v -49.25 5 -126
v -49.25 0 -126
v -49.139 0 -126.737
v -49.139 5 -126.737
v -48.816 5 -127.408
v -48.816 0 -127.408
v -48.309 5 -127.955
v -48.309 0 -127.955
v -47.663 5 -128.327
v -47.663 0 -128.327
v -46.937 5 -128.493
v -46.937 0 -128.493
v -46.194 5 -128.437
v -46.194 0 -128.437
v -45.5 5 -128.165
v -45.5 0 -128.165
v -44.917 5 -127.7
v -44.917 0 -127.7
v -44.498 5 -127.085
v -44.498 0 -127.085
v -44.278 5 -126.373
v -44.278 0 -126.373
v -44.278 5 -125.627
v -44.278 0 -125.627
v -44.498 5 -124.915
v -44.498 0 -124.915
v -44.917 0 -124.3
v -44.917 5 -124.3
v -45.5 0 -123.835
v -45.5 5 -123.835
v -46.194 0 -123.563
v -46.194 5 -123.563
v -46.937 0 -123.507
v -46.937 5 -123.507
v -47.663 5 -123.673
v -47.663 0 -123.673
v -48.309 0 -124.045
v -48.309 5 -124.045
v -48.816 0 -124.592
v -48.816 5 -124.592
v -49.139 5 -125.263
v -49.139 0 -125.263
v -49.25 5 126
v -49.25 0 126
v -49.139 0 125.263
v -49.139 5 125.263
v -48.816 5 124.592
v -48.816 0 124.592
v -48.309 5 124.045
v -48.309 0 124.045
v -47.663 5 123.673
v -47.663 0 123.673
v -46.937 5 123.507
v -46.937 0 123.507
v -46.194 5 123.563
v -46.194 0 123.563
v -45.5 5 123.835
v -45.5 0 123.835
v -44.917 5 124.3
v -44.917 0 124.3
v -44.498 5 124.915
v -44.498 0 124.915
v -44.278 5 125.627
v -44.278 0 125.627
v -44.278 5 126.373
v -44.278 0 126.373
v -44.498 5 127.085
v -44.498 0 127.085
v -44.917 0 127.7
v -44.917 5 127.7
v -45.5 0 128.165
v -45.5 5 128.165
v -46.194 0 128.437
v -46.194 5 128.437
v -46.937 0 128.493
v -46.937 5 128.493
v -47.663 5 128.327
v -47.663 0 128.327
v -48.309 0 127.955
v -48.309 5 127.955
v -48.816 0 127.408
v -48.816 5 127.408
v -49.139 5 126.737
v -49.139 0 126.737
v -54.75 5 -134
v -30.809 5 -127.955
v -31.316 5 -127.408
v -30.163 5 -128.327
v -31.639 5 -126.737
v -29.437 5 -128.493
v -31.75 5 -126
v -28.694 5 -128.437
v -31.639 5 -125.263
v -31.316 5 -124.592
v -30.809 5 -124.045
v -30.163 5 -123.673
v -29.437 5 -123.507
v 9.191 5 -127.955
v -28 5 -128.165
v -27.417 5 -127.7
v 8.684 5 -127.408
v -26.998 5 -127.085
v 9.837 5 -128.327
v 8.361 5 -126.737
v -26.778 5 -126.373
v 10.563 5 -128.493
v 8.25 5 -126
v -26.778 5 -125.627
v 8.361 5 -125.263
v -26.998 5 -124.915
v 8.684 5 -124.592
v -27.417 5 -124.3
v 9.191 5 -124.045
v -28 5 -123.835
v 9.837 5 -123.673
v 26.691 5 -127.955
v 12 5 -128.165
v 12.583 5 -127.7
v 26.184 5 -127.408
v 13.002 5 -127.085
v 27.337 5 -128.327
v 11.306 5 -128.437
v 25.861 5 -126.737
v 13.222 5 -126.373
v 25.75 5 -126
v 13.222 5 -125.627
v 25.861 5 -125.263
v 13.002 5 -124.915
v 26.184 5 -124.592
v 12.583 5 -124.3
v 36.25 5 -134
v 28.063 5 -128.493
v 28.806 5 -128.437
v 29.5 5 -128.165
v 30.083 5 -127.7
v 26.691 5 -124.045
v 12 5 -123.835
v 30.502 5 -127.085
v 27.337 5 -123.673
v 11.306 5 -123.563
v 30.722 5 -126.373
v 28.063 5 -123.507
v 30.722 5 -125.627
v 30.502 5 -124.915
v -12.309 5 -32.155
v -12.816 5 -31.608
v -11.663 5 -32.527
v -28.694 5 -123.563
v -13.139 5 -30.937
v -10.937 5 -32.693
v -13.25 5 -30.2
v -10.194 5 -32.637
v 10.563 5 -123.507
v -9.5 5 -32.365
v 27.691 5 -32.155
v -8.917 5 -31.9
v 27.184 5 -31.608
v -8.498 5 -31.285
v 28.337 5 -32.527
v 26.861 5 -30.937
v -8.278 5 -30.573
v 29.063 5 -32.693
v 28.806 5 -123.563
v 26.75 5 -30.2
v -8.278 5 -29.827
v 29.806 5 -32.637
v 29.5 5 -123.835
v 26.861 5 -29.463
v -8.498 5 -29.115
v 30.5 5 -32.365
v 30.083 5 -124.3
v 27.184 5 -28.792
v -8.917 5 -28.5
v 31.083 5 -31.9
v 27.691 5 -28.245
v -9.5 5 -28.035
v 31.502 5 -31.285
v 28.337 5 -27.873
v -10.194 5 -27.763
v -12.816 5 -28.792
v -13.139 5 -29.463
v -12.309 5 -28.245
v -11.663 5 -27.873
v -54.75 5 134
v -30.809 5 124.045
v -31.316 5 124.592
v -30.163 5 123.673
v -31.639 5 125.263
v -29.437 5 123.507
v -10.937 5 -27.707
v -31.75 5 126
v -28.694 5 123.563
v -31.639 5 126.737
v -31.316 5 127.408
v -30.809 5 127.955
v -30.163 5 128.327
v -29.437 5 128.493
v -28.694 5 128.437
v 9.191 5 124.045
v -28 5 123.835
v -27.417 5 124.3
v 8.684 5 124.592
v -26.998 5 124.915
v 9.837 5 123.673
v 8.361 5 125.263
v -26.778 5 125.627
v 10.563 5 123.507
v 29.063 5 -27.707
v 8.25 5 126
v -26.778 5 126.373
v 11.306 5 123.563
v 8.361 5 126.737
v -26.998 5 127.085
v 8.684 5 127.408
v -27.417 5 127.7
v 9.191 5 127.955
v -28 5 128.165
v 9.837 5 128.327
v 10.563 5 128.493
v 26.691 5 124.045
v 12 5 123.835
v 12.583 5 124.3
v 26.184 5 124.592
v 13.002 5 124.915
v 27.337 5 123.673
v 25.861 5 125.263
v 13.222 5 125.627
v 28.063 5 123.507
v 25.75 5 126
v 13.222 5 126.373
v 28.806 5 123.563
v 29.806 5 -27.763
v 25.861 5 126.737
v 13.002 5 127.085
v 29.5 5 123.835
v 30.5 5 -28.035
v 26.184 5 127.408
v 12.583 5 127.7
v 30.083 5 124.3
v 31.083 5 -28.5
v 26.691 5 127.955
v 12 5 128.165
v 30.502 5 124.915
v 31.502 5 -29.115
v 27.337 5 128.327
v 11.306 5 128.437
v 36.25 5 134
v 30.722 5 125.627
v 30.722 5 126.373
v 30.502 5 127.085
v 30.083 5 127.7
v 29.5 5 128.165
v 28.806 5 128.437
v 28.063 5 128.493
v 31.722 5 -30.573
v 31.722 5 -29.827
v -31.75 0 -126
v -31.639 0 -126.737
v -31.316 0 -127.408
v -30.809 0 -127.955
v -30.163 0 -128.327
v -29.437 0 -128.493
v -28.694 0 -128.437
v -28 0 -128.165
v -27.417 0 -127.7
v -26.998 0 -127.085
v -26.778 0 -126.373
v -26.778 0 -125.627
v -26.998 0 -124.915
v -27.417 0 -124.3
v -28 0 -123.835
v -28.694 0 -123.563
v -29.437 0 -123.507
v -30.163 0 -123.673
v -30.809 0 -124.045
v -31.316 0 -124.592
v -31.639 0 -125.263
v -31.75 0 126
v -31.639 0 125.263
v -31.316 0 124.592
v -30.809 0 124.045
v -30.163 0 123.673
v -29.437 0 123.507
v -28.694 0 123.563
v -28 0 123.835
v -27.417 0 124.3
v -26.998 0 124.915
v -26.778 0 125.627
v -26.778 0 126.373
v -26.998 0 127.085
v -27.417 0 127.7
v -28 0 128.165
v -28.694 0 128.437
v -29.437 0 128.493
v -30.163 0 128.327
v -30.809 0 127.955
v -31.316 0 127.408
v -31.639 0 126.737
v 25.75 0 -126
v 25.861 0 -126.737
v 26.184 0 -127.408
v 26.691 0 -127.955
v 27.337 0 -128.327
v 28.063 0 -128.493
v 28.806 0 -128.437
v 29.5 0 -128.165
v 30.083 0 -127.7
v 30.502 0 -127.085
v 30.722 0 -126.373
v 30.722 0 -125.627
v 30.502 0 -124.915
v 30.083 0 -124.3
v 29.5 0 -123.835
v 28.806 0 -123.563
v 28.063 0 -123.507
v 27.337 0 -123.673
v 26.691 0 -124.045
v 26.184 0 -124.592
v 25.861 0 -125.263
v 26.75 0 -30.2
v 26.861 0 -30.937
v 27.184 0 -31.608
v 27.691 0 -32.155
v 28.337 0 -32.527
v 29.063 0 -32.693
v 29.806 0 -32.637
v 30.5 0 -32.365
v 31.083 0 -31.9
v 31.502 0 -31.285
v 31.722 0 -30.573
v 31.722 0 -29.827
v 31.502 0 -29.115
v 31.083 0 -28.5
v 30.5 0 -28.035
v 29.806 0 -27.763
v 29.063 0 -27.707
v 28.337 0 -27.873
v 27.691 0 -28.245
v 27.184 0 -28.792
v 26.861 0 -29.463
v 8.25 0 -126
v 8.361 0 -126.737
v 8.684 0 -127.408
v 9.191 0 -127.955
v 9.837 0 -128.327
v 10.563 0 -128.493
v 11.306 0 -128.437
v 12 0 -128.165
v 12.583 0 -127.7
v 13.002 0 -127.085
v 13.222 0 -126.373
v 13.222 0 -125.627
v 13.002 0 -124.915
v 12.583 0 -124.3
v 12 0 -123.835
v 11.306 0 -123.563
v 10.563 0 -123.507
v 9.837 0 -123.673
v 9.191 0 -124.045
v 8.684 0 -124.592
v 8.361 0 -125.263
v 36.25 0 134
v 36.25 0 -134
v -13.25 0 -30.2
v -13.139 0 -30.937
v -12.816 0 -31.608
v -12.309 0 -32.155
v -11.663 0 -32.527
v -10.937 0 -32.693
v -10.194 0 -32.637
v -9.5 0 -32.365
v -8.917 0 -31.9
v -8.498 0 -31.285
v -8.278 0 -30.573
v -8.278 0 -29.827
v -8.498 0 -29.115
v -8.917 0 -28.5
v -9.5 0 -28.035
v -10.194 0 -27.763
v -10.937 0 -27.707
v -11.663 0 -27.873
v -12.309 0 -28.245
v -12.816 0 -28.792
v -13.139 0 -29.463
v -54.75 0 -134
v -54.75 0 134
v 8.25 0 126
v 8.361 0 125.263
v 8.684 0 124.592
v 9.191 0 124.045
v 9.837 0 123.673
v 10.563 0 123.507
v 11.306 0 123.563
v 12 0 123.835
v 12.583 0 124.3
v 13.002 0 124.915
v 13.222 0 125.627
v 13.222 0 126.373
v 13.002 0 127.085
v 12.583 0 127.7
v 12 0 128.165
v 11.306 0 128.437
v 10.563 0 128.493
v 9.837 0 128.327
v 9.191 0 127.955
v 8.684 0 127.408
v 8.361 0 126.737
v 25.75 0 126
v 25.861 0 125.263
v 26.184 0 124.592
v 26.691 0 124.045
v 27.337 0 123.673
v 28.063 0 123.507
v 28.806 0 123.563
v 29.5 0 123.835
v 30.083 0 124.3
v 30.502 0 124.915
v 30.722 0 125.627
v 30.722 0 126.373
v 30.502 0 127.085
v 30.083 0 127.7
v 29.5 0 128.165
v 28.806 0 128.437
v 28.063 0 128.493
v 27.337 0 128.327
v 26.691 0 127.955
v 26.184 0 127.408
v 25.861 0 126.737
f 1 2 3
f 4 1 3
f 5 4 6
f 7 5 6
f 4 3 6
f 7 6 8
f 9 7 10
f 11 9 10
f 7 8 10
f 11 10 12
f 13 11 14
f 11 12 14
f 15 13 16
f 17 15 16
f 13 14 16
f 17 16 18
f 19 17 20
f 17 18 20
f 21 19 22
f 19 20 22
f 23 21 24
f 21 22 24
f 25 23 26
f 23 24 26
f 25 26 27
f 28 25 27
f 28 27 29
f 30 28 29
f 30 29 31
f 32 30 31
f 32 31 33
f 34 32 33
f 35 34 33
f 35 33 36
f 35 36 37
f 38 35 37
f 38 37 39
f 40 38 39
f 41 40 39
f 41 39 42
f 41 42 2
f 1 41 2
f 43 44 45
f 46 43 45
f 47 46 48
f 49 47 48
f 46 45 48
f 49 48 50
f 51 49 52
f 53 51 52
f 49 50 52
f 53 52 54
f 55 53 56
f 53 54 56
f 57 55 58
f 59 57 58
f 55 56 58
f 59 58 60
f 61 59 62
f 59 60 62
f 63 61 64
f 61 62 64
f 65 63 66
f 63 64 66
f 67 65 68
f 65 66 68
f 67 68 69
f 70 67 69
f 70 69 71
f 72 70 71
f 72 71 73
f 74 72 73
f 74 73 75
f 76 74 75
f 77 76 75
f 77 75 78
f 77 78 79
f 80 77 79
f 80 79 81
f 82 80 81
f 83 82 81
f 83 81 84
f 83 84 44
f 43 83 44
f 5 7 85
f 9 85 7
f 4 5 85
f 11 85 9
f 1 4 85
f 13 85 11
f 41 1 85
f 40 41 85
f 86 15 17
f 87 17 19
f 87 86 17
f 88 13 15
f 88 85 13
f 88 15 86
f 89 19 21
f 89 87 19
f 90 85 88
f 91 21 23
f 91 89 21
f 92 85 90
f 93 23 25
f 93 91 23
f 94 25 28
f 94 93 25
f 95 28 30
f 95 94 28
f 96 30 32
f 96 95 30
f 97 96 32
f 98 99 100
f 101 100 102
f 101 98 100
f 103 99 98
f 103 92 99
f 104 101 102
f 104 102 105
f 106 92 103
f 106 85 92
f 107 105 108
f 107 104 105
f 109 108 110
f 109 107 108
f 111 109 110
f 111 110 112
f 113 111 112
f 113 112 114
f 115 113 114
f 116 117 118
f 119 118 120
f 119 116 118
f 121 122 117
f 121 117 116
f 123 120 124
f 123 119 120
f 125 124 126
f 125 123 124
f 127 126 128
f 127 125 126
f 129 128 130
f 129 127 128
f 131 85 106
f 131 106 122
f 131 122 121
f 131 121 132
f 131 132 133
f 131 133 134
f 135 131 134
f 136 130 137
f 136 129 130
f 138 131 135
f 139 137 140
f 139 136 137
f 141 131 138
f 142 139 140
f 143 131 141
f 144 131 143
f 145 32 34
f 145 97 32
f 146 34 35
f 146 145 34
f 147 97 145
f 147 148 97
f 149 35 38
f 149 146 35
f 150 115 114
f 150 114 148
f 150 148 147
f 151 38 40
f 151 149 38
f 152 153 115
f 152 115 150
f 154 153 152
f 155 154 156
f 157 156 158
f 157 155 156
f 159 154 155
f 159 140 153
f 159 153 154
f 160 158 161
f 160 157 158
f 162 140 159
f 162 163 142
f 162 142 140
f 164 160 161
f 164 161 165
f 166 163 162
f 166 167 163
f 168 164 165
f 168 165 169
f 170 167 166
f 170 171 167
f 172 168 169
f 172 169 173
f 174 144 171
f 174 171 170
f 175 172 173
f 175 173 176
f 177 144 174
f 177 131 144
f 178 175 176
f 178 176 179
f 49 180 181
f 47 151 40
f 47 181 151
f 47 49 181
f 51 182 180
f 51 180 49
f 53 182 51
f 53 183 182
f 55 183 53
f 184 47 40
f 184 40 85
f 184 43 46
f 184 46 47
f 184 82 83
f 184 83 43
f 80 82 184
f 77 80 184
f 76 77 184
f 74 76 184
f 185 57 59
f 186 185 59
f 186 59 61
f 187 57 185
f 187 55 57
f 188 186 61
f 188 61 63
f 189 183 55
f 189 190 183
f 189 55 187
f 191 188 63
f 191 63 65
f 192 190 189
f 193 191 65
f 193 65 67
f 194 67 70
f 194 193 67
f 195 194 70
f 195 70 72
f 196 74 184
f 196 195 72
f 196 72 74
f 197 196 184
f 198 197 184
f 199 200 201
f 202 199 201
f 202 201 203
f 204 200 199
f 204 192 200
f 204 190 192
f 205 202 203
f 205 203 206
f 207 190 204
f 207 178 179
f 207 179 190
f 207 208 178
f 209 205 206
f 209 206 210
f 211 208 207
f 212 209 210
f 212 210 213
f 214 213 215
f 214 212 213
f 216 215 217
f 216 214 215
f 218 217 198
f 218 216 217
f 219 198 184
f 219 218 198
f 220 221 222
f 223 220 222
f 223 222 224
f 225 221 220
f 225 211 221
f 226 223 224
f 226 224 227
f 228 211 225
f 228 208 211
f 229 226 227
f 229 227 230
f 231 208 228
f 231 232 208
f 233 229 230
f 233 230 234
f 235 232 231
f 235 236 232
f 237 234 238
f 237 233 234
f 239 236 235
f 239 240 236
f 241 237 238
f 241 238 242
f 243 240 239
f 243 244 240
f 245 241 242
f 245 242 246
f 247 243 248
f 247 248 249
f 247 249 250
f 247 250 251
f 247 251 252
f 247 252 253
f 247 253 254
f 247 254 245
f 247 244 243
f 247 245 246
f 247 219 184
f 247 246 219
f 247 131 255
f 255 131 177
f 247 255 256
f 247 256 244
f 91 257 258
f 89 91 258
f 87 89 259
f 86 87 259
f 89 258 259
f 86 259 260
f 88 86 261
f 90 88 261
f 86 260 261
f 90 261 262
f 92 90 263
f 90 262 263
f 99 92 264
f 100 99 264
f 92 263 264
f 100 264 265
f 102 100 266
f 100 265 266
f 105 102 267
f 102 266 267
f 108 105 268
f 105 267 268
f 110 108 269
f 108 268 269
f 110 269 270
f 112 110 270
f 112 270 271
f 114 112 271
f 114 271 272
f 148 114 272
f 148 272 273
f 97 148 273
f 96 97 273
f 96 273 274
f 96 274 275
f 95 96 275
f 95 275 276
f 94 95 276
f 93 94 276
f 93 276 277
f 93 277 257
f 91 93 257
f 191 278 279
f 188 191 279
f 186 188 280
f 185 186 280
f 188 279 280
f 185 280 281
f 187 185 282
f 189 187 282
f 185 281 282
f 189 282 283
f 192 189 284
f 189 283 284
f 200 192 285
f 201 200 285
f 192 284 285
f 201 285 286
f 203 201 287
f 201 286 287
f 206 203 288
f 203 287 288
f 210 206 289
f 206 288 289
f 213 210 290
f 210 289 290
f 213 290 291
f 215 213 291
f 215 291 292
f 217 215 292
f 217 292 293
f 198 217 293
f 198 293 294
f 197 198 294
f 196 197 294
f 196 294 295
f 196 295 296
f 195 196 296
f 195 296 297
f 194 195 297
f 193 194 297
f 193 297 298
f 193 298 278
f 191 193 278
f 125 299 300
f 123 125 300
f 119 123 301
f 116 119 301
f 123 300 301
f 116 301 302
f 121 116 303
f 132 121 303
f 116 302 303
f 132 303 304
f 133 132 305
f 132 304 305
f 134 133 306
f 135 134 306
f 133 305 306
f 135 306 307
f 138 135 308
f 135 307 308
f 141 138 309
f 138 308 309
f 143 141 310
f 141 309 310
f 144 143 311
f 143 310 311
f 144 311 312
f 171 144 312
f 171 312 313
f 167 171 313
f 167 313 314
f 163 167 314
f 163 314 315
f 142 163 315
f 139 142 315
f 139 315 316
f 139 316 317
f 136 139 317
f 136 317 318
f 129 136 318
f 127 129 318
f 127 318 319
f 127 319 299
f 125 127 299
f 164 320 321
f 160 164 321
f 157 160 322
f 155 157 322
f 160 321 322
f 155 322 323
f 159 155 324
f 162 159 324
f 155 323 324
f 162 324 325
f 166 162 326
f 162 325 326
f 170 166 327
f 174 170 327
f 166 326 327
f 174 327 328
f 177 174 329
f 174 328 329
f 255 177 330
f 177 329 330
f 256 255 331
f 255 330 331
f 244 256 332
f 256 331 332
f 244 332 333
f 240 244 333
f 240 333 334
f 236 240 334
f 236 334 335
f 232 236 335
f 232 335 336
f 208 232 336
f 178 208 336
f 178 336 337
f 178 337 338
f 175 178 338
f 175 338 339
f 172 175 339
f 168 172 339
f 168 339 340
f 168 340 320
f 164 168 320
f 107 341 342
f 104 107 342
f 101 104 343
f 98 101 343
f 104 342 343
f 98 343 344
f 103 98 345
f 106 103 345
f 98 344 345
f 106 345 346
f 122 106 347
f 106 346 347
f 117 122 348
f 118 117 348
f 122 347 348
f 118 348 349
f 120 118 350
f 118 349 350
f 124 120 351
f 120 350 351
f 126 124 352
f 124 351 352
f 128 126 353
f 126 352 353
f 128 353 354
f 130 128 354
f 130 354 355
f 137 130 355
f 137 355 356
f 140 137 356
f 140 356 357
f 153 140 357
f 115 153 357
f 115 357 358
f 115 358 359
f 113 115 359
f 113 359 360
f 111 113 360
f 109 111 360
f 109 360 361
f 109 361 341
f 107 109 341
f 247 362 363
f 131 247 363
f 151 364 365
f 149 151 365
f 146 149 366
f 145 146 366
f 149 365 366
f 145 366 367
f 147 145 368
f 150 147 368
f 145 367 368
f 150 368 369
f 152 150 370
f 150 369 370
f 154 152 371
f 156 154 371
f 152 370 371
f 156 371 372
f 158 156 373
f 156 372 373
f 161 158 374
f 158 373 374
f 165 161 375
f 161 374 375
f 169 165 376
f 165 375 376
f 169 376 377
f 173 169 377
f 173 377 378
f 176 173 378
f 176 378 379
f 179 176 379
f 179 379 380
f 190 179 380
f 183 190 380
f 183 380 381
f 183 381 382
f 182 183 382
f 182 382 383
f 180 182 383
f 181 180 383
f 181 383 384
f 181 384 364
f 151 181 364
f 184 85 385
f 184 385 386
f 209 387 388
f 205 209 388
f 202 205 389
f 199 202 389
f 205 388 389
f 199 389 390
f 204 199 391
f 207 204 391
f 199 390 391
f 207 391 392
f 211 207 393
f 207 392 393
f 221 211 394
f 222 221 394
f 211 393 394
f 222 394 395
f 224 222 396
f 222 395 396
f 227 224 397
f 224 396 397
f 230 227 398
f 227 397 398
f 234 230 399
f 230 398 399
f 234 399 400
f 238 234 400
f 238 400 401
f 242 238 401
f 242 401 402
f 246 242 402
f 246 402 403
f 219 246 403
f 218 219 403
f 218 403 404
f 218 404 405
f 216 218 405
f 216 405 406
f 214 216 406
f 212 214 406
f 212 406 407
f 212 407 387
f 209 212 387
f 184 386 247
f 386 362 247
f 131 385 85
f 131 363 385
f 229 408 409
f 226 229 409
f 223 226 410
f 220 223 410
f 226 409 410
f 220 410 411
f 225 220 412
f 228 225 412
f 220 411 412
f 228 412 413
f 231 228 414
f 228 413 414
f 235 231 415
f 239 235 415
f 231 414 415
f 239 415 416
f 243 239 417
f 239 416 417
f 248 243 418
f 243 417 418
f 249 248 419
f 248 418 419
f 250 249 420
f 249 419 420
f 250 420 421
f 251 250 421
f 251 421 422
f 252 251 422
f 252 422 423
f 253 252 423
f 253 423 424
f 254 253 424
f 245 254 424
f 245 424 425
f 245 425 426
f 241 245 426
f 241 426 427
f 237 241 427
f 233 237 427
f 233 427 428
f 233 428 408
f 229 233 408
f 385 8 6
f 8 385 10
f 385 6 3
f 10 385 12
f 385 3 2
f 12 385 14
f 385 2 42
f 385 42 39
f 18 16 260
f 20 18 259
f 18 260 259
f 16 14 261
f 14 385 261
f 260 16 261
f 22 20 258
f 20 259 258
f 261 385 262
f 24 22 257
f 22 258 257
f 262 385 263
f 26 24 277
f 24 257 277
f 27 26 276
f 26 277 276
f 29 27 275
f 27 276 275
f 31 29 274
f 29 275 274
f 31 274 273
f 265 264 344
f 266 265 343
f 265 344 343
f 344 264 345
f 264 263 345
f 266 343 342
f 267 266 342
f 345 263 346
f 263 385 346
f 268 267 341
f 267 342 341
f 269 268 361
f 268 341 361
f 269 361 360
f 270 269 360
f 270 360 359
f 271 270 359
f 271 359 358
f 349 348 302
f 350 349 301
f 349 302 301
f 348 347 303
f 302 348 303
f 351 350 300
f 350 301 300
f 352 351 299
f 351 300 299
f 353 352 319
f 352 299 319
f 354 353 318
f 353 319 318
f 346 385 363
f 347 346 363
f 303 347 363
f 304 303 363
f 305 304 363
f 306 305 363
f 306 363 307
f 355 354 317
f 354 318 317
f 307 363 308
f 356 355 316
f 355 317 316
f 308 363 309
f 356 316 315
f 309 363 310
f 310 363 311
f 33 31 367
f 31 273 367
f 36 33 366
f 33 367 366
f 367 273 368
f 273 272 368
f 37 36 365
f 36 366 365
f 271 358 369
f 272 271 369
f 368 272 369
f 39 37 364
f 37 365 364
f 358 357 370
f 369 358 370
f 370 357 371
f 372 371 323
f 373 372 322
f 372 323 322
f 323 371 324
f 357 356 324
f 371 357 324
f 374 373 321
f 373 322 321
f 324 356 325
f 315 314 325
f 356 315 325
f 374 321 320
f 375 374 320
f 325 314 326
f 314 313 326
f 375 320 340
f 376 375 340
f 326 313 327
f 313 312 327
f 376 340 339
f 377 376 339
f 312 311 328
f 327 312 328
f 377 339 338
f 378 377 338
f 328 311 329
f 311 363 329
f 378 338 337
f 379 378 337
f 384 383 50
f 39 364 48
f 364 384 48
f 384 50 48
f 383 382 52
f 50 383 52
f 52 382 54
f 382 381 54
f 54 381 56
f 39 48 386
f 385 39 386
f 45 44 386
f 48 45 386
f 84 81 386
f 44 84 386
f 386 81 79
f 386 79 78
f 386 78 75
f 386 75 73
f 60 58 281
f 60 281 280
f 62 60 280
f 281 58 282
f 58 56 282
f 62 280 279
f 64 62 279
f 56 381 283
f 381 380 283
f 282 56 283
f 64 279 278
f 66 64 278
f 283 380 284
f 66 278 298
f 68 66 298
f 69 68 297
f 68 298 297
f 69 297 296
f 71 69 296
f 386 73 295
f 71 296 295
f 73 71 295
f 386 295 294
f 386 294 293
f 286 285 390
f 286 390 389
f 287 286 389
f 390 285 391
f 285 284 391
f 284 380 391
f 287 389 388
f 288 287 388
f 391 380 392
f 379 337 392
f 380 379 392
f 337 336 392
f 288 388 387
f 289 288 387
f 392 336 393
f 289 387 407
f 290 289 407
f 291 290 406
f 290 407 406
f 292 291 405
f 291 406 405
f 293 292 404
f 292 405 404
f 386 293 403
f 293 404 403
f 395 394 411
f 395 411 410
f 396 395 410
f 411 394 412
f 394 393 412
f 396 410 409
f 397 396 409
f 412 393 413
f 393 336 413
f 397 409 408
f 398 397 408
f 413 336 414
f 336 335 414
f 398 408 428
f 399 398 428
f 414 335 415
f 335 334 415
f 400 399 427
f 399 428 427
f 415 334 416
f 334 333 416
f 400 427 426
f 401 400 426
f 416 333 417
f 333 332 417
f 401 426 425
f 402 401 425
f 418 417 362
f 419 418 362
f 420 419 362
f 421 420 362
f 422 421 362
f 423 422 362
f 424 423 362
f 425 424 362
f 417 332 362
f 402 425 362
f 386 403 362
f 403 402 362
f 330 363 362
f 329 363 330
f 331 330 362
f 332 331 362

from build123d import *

# Parameters (mm, degrees)
SKIZZE1_W                       = 72.5
SKIZZE1_H                       = 268
AUFSATZ_LINEAR_AUSTRAGEN1_DEPTH = 5
M6_GEWINDEBOHRUNG2_D            = 5
M6_GEWINDEBOHRUNG2_DEPTH        = 5
M6_GEWINDEBOHRUNG1_D            = 5
M6_GEWINDEBOHRUNG1_DEPTH        = 5
SKIZZE7_W                       = 268
SKIZZE7_H                       = 5
AUFSATZ_LINEAR_AUSTRAGEN2_DEPTH = 18.5
M6_GEWINDEBOHRUNG3_D            = 5
M6_GEWINDEBOHRUNG3_DEPTH        = 5


with BuildPart() as part:
    # Skizze1 → Aufsatz-Linear austragen1 (new body)
    with BuildSketch(Plane(origin=(0, 0, 0), x_dir=(1, 0, 0), z_dir=(0, 1, 0))):
        Rectangle(SKIZZE1_W, SKIZZE1_H)
    extrude(amount=AUFSATZ_LINEAR_AUSTRAGEN1_DEPTH)

    # M6 Gewindebohrung2
    with Locations(Plane(origin=(0, 5, 0), x_dir=(1, 0, 0), z_dir=(0, 1, 0))):
        with Locations((-29.25, -126), (10.75, -126), (-29.25, 126), (10.75, 126)):
            Hole(M6_GEWINDEBOHRUNG2_D / 2, depth=M6_GEWINDEBOHRUNG2_DEPTH)

    # M6 Gewindebohrung1
    with Locations(Plane(origin=(0, 5, 0), x_dir=(1, 0, 0), z_dir=(0, 1, 0))):
        with Locations((29.25, 30.2), (-10.75, 30.2)):
            Hole(M6_GEWINDEBOHRUNG1_D / 2, depth=M6_GEWINDEBOHRUNG1_DEPTH)

    # Skizze7 → Aufsatz-Linear austragen2 (add)
    with BuildSketch(Plane.ZY.offset(36.25)):
        with Locations((0, 2.5)):
            Rectangle(SKIZZE7_W, SKIZZE7_H)
    extrude(amount=AUFSATZ_LINEAR_AUSTRAGEN2_DEPTH)

    # M6 Gewindebohrung3
    with Locations(Plane(origin=(0, 5, 0), x_dir=(1, 0, 0), z_dir=(0, 1, 0))):
        with Locations((-46.75, -126), (28.25, -126), (28.25, 126), (-46.75, 126)):
            Hole(M6_GEWINDEBOHRUNG3_D / 2, depth=M6_GEWINDEBOHRUNG3_DEPTH)


solid = part.part
